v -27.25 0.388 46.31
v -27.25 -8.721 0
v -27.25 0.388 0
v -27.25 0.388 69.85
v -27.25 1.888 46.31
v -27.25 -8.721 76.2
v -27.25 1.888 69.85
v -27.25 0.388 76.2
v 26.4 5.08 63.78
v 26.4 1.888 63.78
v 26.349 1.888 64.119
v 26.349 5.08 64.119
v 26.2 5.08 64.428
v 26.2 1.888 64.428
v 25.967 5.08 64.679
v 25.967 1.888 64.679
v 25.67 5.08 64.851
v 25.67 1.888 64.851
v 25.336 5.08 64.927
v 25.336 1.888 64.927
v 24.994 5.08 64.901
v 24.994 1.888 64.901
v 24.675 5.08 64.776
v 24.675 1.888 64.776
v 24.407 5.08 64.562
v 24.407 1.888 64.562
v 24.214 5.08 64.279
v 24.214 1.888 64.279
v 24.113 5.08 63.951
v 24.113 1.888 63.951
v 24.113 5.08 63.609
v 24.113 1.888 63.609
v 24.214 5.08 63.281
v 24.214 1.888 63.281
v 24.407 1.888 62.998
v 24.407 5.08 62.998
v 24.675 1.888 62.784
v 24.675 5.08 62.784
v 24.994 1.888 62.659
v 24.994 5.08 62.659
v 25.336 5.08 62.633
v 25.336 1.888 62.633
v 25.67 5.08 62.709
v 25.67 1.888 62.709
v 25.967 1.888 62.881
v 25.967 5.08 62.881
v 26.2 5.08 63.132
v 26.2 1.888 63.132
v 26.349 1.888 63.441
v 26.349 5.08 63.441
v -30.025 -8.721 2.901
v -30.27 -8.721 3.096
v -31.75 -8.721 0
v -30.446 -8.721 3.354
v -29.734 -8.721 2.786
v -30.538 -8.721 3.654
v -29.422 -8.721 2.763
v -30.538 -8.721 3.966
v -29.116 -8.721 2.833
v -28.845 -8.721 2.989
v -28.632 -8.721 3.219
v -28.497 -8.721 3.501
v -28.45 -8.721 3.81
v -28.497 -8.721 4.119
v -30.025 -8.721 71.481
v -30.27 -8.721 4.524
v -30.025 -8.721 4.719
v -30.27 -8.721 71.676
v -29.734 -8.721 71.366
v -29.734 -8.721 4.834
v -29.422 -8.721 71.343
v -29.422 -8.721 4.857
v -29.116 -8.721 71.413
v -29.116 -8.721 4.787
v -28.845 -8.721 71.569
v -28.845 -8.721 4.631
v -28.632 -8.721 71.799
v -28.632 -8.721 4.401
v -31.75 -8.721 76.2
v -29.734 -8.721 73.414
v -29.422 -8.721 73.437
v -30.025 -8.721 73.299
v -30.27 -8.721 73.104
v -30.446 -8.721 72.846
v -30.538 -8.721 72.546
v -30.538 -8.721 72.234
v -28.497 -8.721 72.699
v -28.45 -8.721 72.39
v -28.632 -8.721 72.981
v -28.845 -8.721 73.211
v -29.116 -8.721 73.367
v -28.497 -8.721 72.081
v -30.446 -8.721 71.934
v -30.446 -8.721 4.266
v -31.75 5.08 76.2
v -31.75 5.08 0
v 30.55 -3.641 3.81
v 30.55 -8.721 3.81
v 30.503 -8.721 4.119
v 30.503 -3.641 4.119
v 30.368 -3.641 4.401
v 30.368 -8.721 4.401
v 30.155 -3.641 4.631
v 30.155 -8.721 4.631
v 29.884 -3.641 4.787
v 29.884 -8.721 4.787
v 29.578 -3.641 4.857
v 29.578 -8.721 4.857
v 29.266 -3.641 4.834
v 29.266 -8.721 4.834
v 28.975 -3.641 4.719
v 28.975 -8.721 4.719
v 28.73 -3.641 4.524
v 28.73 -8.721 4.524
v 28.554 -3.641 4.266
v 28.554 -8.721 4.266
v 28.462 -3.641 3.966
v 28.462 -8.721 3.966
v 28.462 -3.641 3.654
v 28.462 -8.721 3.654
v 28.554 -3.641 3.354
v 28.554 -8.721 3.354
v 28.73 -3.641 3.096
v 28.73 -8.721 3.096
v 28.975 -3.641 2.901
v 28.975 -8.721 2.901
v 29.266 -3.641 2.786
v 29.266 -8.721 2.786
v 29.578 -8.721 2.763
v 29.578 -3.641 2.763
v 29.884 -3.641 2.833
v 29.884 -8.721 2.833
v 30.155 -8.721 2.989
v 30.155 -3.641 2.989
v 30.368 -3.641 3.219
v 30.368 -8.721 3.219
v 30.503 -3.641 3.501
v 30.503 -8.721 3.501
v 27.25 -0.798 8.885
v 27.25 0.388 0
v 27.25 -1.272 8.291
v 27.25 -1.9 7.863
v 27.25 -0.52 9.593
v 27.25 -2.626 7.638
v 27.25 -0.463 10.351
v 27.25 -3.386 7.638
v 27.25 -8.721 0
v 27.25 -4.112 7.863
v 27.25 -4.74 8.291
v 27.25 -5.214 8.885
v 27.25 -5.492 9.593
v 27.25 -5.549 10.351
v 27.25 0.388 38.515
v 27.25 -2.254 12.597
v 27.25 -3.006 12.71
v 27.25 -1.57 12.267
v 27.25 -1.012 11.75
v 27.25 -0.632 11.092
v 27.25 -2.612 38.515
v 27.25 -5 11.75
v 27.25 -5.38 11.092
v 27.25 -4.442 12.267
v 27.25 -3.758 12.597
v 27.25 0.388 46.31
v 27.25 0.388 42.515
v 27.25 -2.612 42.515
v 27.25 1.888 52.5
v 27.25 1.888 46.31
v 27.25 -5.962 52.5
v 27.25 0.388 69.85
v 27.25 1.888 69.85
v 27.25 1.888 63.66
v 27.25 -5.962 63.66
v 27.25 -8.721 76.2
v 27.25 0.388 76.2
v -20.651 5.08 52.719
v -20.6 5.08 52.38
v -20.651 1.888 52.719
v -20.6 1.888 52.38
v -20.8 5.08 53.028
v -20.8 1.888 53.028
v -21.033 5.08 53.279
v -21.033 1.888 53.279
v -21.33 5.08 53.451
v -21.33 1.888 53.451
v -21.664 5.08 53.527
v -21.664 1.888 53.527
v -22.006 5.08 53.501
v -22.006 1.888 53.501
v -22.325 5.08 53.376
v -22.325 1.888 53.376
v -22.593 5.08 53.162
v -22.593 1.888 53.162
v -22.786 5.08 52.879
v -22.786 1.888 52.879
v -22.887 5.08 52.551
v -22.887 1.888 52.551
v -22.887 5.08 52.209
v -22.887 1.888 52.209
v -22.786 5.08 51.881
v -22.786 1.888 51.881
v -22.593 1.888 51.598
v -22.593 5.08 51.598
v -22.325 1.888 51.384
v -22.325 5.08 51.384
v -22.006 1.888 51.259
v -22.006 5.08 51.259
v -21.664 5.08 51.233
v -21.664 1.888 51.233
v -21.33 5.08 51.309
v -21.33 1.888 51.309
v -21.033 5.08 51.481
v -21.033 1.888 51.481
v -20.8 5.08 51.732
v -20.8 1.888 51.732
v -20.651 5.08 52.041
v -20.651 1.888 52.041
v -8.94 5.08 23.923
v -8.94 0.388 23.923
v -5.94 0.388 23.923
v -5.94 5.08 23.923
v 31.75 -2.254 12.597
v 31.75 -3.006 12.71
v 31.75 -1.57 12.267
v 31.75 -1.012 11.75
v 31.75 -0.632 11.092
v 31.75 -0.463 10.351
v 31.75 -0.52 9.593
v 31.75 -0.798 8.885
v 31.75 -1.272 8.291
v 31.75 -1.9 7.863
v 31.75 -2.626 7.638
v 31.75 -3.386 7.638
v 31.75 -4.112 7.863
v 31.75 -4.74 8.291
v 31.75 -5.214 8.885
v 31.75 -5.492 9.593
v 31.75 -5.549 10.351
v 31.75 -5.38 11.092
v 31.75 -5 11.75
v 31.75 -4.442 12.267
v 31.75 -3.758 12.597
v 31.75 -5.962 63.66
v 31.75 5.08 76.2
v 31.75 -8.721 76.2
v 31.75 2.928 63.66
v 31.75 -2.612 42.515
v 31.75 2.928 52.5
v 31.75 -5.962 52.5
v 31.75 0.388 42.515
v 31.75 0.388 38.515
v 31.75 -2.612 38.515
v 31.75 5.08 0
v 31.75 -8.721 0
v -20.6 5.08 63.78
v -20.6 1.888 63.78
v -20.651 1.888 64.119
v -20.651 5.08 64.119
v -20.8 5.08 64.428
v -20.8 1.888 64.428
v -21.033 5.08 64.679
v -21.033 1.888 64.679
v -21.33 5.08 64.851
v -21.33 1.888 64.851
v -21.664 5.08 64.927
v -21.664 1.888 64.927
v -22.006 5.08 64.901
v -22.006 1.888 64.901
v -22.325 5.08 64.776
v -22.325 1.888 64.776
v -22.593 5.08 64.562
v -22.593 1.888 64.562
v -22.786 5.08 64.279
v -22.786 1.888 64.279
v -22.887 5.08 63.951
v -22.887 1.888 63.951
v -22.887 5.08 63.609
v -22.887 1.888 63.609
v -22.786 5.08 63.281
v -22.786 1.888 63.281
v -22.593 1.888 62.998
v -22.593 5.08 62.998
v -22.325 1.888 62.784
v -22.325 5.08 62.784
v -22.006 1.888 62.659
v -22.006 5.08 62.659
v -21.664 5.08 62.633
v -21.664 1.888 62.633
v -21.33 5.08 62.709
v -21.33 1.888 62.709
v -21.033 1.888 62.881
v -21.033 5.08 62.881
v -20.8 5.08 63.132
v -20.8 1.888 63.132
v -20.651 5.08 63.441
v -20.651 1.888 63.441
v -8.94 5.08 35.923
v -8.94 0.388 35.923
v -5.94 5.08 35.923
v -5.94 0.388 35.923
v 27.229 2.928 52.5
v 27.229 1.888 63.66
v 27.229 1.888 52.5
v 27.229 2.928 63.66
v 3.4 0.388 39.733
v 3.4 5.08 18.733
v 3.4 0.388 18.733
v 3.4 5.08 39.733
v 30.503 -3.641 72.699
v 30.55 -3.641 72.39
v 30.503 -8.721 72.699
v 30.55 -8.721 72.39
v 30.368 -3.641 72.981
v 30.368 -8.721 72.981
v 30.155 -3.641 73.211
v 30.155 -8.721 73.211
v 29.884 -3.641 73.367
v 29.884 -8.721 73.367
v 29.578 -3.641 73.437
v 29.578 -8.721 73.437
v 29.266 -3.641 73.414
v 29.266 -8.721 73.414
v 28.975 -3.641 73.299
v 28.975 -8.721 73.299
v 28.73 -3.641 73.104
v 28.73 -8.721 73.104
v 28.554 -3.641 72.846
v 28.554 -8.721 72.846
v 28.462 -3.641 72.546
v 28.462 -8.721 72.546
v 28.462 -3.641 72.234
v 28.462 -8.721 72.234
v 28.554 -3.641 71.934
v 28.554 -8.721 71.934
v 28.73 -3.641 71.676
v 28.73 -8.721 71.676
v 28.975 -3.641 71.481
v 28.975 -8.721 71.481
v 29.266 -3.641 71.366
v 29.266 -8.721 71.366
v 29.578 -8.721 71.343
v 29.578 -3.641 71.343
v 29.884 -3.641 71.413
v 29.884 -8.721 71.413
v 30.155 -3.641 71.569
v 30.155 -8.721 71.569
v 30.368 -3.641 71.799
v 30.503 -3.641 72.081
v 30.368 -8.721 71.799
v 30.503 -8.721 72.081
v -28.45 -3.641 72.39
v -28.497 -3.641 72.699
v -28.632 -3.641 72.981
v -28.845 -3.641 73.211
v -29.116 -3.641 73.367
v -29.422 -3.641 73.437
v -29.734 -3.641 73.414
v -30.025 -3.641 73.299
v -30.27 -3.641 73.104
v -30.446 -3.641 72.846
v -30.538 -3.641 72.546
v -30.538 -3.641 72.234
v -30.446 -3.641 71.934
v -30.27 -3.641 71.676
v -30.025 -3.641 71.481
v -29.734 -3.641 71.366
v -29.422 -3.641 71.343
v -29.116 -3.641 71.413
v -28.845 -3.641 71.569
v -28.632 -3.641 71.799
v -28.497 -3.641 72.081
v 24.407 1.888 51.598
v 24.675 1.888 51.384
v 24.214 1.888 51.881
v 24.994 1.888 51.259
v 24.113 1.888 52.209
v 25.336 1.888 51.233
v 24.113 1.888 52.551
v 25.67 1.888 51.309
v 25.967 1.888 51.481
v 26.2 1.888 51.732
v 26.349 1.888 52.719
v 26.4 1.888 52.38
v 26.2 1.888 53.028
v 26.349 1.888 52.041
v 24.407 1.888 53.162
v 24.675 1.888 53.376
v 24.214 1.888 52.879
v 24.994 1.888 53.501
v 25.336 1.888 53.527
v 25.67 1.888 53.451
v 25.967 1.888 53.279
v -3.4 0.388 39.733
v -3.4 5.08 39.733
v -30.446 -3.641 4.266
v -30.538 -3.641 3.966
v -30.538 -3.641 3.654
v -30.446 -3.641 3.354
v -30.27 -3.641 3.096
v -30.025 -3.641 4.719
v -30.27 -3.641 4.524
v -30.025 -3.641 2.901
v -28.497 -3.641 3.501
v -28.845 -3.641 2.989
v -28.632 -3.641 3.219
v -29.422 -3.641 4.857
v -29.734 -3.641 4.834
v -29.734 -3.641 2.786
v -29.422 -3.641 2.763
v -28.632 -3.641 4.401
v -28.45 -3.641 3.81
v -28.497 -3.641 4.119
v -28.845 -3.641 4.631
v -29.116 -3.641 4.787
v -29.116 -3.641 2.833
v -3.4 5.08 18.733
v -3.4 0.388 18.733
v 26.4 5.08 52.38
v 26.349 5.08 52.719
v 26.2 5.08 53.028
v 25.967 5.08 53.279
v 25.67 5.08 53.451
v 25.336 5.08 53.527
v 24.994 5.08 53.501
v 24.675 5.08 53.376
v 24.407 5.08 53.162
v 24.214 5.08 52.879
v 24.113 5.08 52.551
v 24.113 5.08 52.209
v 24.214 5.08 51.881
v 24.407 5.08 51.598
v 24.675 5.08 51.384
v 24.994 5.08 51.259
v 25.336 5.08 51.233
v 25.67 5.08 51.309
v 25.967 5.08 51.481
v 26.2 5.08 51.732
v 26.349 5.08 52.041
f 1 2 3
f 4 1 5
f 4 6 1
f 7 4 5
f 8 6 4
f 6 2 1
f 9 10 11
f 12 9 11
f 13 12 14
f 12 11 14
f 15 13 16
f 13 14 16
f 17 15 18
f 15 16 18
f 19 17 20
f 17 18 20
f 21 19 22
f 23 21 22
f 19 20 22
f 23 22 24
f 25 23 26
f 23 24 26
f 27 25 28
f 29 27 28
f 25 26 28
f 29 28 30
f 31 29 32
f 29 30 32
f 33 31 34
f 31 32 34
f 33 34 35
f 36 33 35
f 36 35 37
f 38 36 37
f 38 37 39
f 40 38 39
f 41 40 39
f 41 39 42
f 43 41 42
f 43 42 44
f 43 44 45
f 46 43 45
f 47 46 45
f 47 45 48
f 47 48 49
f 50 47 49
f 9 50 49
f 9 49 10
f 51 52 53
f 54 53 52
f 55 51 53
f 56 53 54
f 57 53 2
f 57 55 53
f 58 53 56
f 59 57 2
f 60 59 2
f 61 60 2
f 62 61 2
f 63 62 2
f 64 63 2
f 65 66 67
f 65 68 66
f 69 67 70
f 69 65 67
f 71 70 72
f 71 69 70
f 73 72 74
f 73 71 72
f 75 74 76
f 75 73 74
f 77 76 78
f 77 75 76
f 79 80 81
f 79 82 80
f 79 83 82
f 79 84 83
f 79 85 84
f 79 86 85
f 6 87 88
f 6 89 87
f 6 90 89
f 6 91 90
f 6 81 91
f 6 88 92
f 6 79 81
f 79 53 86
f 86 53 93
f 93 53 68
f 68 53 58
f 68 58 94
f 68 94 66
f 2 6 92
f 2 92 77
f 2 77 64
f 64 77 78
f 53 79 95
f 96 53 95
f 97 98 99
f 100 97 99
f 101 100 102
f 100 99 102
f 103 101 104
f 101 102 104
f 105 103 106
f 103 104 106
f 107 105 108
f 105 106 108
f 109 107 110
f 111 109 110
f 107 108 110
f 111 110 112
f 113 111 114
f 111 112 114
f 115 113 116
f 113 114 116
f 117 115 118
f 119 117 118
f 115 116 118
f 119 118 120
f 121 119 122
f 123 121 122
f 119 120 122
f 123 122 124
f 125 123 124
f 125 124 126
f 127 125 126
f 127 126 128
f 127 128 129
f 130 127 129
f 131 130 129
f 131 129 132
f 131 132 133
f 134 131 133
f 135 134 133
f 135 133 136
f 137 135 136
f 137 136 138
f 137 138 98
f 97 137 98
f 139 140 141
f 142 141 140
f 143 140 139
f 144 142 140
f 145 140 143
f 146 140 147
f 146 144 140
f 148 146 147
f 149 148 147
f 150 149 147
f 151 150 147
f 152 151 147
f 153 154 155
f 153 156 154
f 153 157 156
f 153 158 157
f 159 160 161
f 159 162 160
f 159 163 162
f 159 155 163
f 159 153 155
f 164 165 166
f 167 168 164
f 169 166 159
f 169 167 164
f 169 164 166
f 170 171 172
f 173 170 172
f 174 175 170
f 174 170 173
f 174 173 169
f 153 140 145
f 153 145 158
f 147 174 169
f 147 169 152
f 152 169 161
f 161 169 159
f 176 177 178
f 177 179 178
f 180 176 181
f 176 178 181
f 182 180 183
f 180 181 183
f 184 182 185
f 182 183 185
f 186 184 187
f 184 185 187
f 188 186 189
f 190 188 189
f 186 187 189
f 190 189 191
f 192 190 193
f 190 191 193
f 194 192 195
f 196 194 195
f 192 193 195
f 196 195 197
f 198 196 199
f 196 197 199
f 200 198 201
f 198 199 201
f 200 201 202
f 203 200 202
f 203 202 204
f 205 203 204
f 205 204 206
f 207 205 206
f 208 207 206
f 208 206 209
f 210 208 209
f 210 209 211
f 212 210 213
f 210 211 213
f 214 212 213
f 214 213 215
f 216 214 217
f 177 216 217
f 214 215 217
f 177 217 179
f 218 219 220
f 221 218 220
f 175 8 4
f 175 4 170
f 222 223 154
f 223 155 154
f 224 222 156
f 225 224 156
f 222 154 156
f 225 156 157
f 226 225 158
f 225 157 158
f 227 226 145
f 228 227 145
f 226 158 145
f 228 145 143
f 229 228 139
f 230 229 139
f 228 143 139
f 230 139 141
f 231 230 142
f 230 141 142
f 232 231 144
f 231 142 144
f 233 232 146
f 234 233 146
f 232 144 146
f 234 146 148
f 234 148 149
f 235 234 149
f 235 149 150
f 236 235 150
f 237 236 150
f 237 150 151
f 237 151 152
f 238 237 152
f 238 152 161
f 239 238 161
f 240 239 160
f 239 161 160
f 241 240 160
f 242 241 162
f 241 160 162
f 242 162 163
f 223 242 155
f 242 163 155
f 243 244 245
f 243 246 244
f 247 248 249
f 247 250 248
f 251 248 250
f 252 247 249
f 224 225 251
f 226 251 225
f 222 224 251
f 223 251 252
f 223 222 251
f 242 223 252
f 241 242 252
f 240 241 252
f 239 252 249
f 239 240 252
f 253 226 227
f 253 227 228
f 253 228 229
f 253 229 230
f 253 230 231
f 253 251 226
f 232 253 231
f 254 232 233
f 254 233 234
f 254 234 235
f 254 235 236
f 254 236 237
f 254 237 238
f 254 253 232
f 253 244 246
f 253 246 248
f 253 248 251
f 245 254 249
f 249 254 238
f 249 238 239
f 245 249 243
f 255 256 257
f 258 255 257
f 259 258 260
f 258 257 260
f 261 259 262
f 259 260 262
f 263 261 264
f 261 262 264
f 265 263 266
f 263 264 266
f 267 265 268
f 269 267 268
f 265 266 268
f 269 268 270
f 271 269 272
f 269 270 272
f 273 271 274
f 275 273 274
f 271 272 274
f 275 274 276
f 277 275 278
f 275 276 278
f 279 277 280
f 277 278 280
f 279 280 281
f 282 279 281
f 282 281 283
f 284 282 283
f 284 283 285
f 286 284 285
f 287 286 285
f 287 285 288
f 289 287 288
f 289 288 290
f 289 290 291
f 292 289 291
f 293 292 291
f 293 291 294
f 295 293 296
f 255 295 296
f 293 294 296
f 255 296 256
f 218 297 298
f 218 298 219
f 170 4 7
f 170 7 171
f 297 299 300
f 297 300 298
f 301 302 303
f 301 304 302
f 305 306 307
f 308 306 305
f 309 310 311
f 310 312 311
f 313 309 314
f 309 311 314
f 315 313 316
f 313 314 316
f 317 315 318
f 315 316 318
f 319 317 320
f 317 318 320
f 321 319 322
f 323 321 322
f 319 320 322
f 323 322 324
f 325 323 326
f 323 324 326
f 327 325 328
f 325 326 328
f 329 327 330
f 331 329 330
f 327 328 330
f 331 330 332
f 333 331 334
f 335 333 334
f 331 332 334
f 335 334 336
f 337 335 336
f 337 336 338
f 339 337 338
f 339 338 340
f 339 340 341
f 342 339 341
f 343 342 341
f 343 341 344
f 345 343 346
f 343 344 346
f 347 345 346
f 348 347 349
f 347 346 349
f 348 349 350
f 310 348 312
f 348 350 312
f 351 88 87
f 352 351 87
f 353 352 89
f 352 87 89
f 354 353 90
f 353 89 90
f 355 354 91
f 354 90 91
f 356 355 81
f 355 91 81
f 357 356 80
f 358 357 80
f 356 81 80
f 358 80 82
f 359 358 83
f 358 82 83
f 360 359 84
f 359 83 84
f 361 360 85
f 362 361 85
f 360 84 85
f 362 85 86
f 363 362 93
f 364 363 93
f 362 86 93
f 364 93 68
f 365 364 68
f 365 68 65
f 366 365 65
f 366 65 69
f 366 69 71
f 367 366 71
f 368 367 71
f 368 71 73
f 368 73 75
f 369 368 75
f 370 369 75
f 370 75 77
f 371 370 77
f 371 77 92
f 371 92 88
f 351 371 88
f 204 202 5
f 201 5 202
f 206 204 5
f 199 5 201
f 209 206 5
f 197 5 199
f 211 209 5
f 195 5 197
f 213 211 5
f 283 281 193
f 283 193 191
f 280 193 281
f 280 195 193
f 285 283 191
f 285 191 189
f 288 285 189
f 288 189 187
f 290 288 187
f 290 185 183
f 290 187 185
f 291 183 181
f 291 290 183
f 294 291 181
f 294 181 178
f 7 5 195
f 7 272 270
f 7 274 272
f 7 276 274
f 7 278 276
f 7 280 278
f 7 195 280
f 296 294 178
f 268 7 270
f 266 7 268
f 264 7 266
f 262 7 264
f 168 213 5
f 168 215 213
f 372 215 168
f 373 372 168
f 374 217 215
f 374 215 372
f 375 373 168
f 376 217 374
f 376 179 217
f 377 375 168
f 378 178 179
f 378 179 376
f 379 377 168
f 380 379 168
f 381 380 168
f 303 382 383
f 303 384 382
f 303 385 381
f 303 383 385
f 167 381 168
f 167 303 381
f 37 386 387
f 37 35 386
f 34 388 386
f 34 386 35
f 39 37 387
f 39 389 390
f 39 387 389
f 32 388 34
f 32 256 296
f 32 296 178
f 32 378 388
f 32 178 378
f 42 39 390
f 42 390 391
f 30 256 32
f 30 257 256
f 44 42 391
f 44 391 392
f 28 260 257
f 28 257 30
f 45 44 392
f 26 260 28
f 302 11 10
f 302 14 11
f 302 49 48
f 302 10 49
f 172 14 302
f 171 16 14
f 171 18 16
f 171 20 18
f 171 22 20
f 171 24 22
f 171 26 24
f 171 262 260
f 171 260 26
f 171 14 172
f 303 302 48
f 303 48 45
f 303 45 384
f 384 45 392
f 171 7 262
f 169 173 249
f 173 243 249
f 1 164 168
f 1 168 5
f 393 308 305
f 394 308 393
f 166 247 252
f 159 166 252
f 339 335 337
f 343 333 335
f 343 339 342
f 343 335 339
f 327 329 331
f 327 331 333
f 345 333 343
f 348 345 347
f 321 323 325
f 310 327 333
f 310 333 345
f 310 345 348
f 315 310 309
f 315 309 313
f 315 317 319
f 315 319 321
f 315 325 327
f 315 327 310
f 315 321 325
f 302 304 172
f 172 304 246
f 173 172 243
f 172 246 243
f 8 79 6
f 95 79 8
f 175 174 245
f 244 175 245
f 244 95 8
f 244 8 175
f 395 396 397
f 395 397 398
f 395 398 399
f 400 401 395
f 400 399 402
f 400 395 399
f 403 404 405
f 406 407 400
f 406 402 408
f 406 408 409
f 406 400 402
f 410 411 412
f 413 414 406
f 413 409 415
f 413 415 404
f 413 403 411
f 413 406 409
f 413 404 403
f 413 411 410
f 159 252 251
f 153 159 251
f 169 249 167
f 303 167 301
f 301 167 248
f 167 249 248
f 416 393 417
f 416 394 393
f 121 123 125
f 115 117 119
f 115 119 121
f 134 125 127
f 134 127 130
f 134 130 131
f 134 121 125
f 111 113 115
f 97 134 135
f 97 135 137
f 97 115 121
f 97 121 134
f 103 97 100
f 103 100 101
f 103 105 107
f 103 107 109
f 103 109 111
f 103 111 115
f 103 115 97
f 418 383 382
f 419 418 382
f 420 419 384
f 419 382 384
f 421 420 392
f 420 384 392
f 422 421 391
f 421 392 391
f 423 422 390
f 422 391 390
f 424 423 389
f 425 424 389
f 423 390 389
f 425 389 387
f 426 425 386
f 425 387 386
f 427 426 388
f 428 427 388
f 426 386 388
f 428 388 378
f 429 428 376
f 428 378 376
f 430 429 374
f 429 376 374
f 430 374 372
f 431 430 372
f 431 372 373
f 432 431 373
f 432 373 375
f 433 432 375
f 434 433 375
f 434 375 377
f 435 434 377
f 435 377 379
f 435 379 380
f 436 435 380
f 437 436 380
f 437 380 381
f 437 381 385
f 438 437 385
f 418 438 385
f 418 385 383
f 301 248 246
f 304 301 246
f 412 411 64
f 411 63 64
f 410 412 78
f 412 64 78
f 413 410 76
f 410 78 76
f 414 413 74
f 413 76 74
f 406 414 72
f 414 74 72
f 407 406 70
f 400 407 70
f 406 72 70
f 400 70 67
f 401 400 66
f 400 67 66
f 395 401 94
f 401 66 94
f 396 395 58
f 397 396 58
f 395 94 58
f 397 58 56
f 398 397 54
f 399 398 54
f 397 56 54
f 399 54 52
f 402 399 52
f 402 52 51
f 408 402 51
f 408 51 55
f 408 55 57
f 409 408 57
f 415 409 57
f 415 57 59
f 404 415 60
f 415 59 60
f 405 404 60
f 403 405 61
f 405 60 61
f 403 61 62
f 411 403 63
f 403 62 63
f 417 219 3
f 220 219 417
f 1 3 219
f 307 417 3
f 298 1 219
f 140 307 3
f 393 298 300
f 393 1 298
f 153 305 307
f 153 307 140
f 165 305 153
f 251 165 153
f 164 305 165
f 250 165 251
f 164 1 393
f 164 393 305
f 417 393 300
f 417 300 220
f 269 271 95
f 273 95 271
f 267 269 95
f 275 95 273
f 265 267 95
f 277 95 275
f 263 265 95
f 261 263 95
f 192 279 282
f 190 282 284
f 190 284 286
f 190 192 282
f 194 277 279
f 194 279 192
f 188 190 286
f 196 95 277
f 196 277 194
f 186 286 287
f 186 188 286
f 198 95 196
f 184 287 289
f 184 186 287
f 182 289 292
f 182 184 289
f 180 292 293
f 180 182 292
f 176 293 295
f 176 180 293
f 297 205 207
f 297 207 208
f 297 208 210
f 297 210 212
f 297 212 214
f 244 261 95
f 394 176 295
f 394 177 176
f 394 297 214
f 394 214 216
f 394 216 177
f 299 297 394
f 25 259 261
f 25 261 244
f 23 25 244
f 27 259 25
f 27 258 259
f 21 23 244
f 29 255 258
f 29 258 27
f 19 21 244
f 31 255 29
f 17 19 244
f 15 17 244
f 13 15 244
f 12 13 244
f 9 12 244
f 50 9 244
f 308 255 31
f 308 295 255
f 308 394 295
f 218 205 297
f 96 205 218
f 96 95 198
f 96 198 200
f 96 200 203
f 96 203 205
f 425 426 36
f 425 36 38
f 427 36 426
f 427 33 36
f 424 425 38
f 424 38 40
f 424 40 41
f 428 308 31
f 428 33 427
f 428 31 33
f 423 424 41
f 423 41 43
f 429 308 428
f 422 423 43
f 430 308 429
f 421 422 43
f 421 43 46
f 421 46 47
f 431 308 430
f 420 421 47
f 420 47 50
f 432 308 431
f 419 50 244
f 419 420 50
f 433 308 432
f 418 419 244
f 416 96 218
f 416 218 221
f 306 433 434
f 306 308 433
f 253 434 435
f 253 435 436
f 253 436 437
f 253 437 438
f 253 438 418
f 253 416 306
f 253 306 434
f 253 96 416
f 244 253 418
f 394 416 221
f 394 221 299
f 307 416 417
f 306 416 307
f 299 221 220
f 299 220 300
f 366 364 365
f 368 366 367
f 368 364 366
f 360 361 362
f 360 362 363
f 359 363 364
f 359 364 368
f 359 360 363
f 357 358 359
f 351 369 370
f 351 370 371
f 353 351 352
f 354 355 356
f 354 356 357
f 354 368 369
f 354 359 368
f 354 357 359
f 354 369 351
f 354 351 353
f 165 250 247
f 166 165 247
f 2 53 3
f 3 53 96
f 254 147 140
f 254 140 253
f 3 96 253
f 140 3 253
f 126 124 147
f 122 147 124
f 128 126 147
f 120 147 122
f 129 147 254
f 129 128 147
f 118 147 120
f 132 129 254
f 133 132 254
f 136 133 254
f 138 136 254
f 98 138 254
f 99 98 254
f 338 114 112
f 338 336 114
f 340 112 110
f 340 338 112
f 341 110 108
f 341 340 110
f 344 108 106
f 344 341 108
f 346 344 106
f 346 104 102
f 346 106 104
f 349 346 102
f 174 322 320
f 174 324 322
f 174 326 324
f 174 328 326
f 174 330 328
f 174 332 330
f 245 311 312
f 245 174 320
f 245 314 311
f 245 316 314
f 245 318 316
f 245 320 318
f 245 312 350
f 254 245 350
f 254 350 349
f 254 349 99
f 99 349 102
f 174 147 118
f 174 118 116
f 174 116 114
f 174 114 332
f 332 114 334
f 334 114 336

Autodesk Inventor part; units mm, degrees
ref_plane "YZ Plane" through (0, 0, 0) normal (1, 0, 0) x (0, 1, 0)
ref_plane "XZ Plane" through (0, 0, 0) normal (0, 1, 0) x (-1, 0, 0)
ref_plane "XY Plane" through (0, 0, 0) normal (0, 0, 1) x (1, 0, 0)
sketch "Sketch1" plane through (0, 0, 0) normal (0, 0, 1) x (1, 0, 0)
  line L0 (-31.75, 5.08) -> (31.75, 5.08)
  line L1 (31.75, 5.08) -> (31.75, -5.08)
  line L2 (31.75, -5.08) -> (-31.75, -5.08)
  line L3 (-31.75, -5.08) -> (-31.75, 5.08)
  point P0 (0, 0)
  dimension "d0" = 63.5
  dimension "d3" = 31.75
  dimension "d4" = 10.16
  dimension "d17" = 5.08
extrude "Extrusion1" add sketch "Sketch1" along normal blind 76.2
sketch "Sketch3" plane through (0, 0, 76.2) normal (0, 0, 1) x (1, 0, 0)
  line L0 (-27.25, 0.3875) -> (27.25, 0.3875)
  line L1 (27.25, 0.3875) -> (27.25, -0.3745)
  line L2 (27.25, -0.3745) -> (-27.25, -0.3745)
  line L3 (-27.25, -0.3745) -> (-27.25, 0.3875)
  line L4 (-31.75, 5.08) -> (-31.75, -5.08) projected
  point P0 (0, 0)
  point P1 (-27.25, 0.0065)
  dimension "d131" = 7.62
  dimension "d6" = 0.762
  dimension "d7" = 54.5
  dimension "d8" = 4.5
extrude "Extrusion2" cut sketch "Sketch3" against normal blind 85.1
sketch "Sketch8" plane through (0, 0, 76.2) normal (0, 0, 1) x (1, 0, 0)
  line L0 (-31.75, -5.08) -> (31.75, -5.08) projected
  line L1 (31.75, -5.08) -> (31.75, 5.08) projected
  line L2 (-31.75, -5.08) -> (31.75, -5.08)
  line L3 (31.75, -5.08) -> (31.75, 0.3875)
  line L4 (31.75, 0.3875) -> (-31.75, 0.3875)
  line L5 (27.25, 0.3875) -> (27.25, -0.3745) projected
  line L6 (27.25, -0.3745) -> (-27.25, -0.3745) projected
  line L7 (-27.25, -0.3745) -> (-27.25, 0.3875) projected
  line L8 (-27.25, 0.3875) -> (27.25, 0.3875) projected
  line L9 (-31.75, -5.08) -> (31.75, -5.08) projected
  line L10 (31.75, -5.08) -> (31.75, 5.08) projected
  line L11 (31.75, 5.08) -> (-31.75, 5.08) projected
  line L12 (-31.75, 5.08) -> (-31.75, -5.08) projected
  line L13 (-27.25, 0.3875) -> (-27.25, -0.3745) projected
  line L14 (-27.25, 0.3875) -> (27.25, 0.3875)
  line L15 (27.25, 0.3875) -> (27.25, -5.08)
  line L16 (27.25, -5.08) -> (-27.25, -5.08)
  line L17 (-27.25, -5.08) -> (-27.25, 0.3875)
  point P0 (0, 0)
  dimension "d30" = 0
sketch "Sketch9" plane through (-31.75, 5.08, 0) normal (0, 1, 0) x (1, 0, 0)
  line L0 (28.35, -18.7333) -> (35.15, -18.7333)
  line L1 (35.15, -18.7333) -> (35.15, -39.7333)
  line L2 (35.15, -39.7333) -> (28.35, -39.7333)
  line L3 (28.35, -39.7333) -> (28.35, -18.7333)
  line L4 (0, 0) -> (0, -76.2) projected
  line L5 (63.5, 0) -> (0, 0) projected
  point P0 (31.75, 0)
  point P1 (0, -38.1)
  dimension "d31" = 21
  dimension "d32" = 6.8
  dimension "d33" = 28.35
  dimension "d34" = 18.7333
extrude "Extrusion6" cut sketch "Sketch8" against normal blind 76.2 contours L17 L6 L15 L0
sketch "Sketch11" plane through (0, 0, 76.2) normal (0, 0, 1) x (1, 0, 0)
  point P0 (0, 0)
sketch "Sketch12" plane through (-31.75, -5.08, 0) normal (0, -1, 0) x (1, 0, 0)
  line L0 (4.5, 0) -> (4.5, 76.2) projected
  line L1 (0, 76.2) -> (4.5, 76.2) projected
  line L2 (0, 0) -> (0, 76.2) projected
  line L3 (0, 0) -> (4.5, 0) projected
  line L4 (59, 76.2) -> (59, 0) projected
  line L5 (59, 0) -> (63.5, 0) projected
  line L6 (63.5, 0) -> (63.5, 76.2) projected
  line L7 (59, 76.2) -> (63.5, 76.2) projected
  point P0 (31.75, 0)
extrude "Extrusion7" add sketch "Sketch12" along normal blind 3.641
extrude "Extrusion8" cut sketch "Sketch9" against normal blind 19.5
sketch "Sketch13" plane through (-31.75, -8.721, 0) normal (0, -1, 0) x (1, 0, 0)
  point P0 (31.75, 0)
sketch "Sketch14" plane through (27.25, 0.3875, 0) normal (-1, 0, 0) x (0, 0, 1)
  circle A0 centre (10.16, -3.3935) radius 2.55
  line L0 (76.2, 0) -> (0, 0) projected
  line L1 (76.2, -9.1085) -> (0, -9.1085) projected
  line L2 (0, -9.1085) -> (0, 0) projected
  point P0 (0, -0.3875)
  dimension "d41" = 5.1
  dimension "d43" = 5.715
  dimension "d44" = 10.16
extrude "Extrusion9" cut sketch "Sketch14" against normal blind 25.4
sketch "Sketch17" plane through (-31.75, -8.721, 0) normal (0, -1, 0) x (1, 0, 0)
  circle A0 centre (61.25, 3.81) radius 1.05
  line L0 (59, 0) -> (63.5, 0) projected
  line L1 (59, 76.2) -> (59, 0) projected
  circle A1 centre (2.25, 3.81) radius 1.05
  line L2 (0, 76.2) -> (0, 0) projected
  line L3 (0, 0) -> (4.5, 0) projected
  circle A2 centre (2.25, 72.39) radius 1.05
  circle A3 centre (61.25, 72.39) radius 1.05
  line L4 (4.5, 76.2) -> (0, 76.2) projected
  line L5 (63.5, 76.2) -> (59, 76.2) projected
  point P0 (31.75, 0)
  dimension "d98" = 2.1
  dimension "d99" = 3.81
  dimension "d100" = 2.25
  dimension "d101" = 2.25
  dimension "d102" = 2.1
  dimension "d103" = 3.81
  dimension "d104" = 2.1
  dimension "d105" = 2.1
  dimension "d106" = 3.81
  dimension "d107" = 3.81
  dimension "d108" = 2.25
extrude "Extrusion11" cut sketch "Sketch17" against normal blind 5.08
sketch "Sketch20" plane through (-31.75, 5.08, 0) normal (0, 1, 0) x (1, 0, 0)
  line L0 (22.81, -23.9233) -> (25.81, -23.9233)
  line L1 (25.81, -23.9233) -> (25.81, -35.9233)
  line L2 (25.81, -35.9233) -> (22.81, -35.9233)
  line L3 (22.81, -35.9233) -> (22.81, -23.9233)
  line L4 (28.35, -39.7333) -> (28.35, -18.7333) projected
  line L5 (35.15, -39.7333) -> (28.35, -39.7333) projected
  point P0 (31.75, 0)
  point P1 (31.75, -39.7333)
  dimension "d141" = 3
  dimension "d142" = 2.54
  dimension "d143" = 12
  dimension "d144" = 3.81
extrude "Extrusion14" cut sketch "Sketch20" against normal blind 25.4
sketch "Sketch18" plane through (-27.25, 0.3875, 76.2) normal (0, -1, 0) x (1, 0, 0)
  circle A0 centre (5.5, -23.82) radius 1.15
  circle A1 centre (5.5, -12.42) radius 1.05
  circle A2 centre (5.5, -12.42) radius 1.15
  line L0 (3.5, -28.62) -> (3.5, -7.62)
  circle A3 centre (5.5, -23.82) radius 1.05
  line L1 (54.5, -28.62) -> (3.5, -28.62)
  line L2 (3.5, -7.62) -> (54.5, -7.62)
  circle A4 centre (52.5, -12.42) radius 1.05
  circle A5 centre (52.5, -12.42) radius 1.15
  line L3 (54.5, -7.62) -> (54.5, -28.62)
  circle A6 centre (52.5, -23.82) radius 1.05
  circle A7 centre (52.5, -23.82) radius 1.15
  line L4 (0, 0) -> (54.5, 0) projected
  line L5 (54.5, 0) -> (54.5, -76.2) projected
  point P0 (27.25, -76.2)
  dimension "d111" = 21
  dimension "d112" = 51
  dimension "d113" = 2.1
  dimension "d114" = 2.1
  dimension "d115" = 2.1
  dimension "d116" = 2.1
  dimension "d117" = 2
  dimension "d118" = 2
  dimension "d119" = 2
  dimension "d120" = 2
  dimension "d121" = 11.4
  dimension "d122" = 4.8
  dimension "d123" = 11.4
  dimension "d124" = 4.8
  dimension "d125" = 0.1
  dimension "d126" = 0.1
  dimension "d127" = 0.1
  dimension "d128" = 0.1
  dimension "d131" = 7.62
  dimension "d132" = 0
extrude "Extrusion12" cut sketch "Sketch18" against normal blind 25.4 contours A0 | A1 | A2 | A3 | A4 | A5 | A6 | A7
sketch "Sketch21" plane through (-31.75, -8.721, 0) normal (0, -1, 0) x (1, 0, 0)
  line L0 (59, 76.2) -> (59, 0) projected
  line L1 (59, 69.5452) -> (61.2521, 69.5452)
  line L2 (61.2521, 69.5452) -> (61.2521, 46.6852)
  line L3 (61.2521, 46.6852) -> (59, 46.6852)
  line L4 (59, 46.6852) -> (59, 69.5452)
  line L5 (63.5, 0) -> (63.5, 76.2) projected
  line L6 (63.5, 76.2) -> (59, 76.2) projected
  point P0 (31.75, 0)
  dimension "d147" = 4.5
  dimension "d148" = 2.2479
  dimension "d149" = 6.6548
  dimension "d150" = 22.86
sketch "Sketch22" plane through (31.75, 5.08, 76.2) normal (1, 0, 0) x (0, 0, -1)
  line L0 (13.57, -4.6925) -> (13.57, 0) projected
  line L1 (13.57, -4.6925) -> (13.57, 0) projected
  line L2 (24.97, -4.6925) -> (24.97, 0) projected
  line L3 (22.67, -4.6925) -> (22.67, 0) projected
  line L4 (11.27, -4.6925) -> (11.27, 0) projected
  line L5 (23.7, -2.1525) -> (12.54, -2.1525)
  line L6 (12.54, -2.1525) -> (12.54, -11.0425)
  line L7 (12.54, -11.0425) -> (23.7, -11.0425)
  line L8 (23.7, -11.0425) -> (23.7, -2.1525)
  point P0 (76.2, -5.08)
  point P1 (24.97, -2.1525)
  point P2 (11.27, -2.6605)
  dimension "d152" = 8.89
  dimension "d153" = 2.54
  dimension "d169" = 1.27
  dimension "d170" = 1.27
extrude "Extrusion15" cut sketch "Sketch22" against normal blind 4.5212
sketch "Sketch24" plane through (31.75, 5.08, 76.2) normal (1, 0, 0) x (0, 0, -1)
  line L0 (37.6849, -4.6925) -> (33.6849, -4.6925)
  line L1 (33.6849, -4.6925) -> (33.6849, -7.6925)
  line L2 (33.6849, -7.6925) -> (37.6849, -7.6925)
  line L3 (37.6849, -7.6925) -> (37.6849, -4.6925)
  line L4 (0, -4.6925) -> (76.2, -4.6925) projected
  point P0 (76.2, -5.08)
  point P1 (23.7, -4.6925)
  dimension "d163" = 4
  dimension "d164" = 3
  dimension "d165" = 0
extrude "Extrusion16" cut sketch "Sketch24" against normal blind 9.1211
sketch "Sketch27" plane through (-27.25, 0.3875, 76.2) normal (0, -1, 0) x (1, 0, 0)
  line L0 (54.5, 0) -> (54.5, -76.2) projected
  line L1 (0, 0) -> (0, -76.2) projected
  line L2 (54.5, -29.89) -> (0, -29.89)
  line L3 (0, -29.89) -> (0, -6.35)
  line L4 (0, -6.35) -> (54.5, -6.35)
  line L5 (54.5, -6.35) -> (54.5, -29.89)
  line L6 (54.5, -28.62) -> (3.5, -28.62) projected
  line L7 (3.5, -7.62) -> (54.5, -7.62) projected
  point P0 (27.25, -76.2)
  point P1 (54.5, -6.35)
  point P2 (0, -29.89)
  dimension "d171" = 1.27
  dimension "d172" = 1.27
extrude "Extrusion17" cut sketch "Sketch27" against normal blind 1.5
properties part number "Scanner_Test_Top"
